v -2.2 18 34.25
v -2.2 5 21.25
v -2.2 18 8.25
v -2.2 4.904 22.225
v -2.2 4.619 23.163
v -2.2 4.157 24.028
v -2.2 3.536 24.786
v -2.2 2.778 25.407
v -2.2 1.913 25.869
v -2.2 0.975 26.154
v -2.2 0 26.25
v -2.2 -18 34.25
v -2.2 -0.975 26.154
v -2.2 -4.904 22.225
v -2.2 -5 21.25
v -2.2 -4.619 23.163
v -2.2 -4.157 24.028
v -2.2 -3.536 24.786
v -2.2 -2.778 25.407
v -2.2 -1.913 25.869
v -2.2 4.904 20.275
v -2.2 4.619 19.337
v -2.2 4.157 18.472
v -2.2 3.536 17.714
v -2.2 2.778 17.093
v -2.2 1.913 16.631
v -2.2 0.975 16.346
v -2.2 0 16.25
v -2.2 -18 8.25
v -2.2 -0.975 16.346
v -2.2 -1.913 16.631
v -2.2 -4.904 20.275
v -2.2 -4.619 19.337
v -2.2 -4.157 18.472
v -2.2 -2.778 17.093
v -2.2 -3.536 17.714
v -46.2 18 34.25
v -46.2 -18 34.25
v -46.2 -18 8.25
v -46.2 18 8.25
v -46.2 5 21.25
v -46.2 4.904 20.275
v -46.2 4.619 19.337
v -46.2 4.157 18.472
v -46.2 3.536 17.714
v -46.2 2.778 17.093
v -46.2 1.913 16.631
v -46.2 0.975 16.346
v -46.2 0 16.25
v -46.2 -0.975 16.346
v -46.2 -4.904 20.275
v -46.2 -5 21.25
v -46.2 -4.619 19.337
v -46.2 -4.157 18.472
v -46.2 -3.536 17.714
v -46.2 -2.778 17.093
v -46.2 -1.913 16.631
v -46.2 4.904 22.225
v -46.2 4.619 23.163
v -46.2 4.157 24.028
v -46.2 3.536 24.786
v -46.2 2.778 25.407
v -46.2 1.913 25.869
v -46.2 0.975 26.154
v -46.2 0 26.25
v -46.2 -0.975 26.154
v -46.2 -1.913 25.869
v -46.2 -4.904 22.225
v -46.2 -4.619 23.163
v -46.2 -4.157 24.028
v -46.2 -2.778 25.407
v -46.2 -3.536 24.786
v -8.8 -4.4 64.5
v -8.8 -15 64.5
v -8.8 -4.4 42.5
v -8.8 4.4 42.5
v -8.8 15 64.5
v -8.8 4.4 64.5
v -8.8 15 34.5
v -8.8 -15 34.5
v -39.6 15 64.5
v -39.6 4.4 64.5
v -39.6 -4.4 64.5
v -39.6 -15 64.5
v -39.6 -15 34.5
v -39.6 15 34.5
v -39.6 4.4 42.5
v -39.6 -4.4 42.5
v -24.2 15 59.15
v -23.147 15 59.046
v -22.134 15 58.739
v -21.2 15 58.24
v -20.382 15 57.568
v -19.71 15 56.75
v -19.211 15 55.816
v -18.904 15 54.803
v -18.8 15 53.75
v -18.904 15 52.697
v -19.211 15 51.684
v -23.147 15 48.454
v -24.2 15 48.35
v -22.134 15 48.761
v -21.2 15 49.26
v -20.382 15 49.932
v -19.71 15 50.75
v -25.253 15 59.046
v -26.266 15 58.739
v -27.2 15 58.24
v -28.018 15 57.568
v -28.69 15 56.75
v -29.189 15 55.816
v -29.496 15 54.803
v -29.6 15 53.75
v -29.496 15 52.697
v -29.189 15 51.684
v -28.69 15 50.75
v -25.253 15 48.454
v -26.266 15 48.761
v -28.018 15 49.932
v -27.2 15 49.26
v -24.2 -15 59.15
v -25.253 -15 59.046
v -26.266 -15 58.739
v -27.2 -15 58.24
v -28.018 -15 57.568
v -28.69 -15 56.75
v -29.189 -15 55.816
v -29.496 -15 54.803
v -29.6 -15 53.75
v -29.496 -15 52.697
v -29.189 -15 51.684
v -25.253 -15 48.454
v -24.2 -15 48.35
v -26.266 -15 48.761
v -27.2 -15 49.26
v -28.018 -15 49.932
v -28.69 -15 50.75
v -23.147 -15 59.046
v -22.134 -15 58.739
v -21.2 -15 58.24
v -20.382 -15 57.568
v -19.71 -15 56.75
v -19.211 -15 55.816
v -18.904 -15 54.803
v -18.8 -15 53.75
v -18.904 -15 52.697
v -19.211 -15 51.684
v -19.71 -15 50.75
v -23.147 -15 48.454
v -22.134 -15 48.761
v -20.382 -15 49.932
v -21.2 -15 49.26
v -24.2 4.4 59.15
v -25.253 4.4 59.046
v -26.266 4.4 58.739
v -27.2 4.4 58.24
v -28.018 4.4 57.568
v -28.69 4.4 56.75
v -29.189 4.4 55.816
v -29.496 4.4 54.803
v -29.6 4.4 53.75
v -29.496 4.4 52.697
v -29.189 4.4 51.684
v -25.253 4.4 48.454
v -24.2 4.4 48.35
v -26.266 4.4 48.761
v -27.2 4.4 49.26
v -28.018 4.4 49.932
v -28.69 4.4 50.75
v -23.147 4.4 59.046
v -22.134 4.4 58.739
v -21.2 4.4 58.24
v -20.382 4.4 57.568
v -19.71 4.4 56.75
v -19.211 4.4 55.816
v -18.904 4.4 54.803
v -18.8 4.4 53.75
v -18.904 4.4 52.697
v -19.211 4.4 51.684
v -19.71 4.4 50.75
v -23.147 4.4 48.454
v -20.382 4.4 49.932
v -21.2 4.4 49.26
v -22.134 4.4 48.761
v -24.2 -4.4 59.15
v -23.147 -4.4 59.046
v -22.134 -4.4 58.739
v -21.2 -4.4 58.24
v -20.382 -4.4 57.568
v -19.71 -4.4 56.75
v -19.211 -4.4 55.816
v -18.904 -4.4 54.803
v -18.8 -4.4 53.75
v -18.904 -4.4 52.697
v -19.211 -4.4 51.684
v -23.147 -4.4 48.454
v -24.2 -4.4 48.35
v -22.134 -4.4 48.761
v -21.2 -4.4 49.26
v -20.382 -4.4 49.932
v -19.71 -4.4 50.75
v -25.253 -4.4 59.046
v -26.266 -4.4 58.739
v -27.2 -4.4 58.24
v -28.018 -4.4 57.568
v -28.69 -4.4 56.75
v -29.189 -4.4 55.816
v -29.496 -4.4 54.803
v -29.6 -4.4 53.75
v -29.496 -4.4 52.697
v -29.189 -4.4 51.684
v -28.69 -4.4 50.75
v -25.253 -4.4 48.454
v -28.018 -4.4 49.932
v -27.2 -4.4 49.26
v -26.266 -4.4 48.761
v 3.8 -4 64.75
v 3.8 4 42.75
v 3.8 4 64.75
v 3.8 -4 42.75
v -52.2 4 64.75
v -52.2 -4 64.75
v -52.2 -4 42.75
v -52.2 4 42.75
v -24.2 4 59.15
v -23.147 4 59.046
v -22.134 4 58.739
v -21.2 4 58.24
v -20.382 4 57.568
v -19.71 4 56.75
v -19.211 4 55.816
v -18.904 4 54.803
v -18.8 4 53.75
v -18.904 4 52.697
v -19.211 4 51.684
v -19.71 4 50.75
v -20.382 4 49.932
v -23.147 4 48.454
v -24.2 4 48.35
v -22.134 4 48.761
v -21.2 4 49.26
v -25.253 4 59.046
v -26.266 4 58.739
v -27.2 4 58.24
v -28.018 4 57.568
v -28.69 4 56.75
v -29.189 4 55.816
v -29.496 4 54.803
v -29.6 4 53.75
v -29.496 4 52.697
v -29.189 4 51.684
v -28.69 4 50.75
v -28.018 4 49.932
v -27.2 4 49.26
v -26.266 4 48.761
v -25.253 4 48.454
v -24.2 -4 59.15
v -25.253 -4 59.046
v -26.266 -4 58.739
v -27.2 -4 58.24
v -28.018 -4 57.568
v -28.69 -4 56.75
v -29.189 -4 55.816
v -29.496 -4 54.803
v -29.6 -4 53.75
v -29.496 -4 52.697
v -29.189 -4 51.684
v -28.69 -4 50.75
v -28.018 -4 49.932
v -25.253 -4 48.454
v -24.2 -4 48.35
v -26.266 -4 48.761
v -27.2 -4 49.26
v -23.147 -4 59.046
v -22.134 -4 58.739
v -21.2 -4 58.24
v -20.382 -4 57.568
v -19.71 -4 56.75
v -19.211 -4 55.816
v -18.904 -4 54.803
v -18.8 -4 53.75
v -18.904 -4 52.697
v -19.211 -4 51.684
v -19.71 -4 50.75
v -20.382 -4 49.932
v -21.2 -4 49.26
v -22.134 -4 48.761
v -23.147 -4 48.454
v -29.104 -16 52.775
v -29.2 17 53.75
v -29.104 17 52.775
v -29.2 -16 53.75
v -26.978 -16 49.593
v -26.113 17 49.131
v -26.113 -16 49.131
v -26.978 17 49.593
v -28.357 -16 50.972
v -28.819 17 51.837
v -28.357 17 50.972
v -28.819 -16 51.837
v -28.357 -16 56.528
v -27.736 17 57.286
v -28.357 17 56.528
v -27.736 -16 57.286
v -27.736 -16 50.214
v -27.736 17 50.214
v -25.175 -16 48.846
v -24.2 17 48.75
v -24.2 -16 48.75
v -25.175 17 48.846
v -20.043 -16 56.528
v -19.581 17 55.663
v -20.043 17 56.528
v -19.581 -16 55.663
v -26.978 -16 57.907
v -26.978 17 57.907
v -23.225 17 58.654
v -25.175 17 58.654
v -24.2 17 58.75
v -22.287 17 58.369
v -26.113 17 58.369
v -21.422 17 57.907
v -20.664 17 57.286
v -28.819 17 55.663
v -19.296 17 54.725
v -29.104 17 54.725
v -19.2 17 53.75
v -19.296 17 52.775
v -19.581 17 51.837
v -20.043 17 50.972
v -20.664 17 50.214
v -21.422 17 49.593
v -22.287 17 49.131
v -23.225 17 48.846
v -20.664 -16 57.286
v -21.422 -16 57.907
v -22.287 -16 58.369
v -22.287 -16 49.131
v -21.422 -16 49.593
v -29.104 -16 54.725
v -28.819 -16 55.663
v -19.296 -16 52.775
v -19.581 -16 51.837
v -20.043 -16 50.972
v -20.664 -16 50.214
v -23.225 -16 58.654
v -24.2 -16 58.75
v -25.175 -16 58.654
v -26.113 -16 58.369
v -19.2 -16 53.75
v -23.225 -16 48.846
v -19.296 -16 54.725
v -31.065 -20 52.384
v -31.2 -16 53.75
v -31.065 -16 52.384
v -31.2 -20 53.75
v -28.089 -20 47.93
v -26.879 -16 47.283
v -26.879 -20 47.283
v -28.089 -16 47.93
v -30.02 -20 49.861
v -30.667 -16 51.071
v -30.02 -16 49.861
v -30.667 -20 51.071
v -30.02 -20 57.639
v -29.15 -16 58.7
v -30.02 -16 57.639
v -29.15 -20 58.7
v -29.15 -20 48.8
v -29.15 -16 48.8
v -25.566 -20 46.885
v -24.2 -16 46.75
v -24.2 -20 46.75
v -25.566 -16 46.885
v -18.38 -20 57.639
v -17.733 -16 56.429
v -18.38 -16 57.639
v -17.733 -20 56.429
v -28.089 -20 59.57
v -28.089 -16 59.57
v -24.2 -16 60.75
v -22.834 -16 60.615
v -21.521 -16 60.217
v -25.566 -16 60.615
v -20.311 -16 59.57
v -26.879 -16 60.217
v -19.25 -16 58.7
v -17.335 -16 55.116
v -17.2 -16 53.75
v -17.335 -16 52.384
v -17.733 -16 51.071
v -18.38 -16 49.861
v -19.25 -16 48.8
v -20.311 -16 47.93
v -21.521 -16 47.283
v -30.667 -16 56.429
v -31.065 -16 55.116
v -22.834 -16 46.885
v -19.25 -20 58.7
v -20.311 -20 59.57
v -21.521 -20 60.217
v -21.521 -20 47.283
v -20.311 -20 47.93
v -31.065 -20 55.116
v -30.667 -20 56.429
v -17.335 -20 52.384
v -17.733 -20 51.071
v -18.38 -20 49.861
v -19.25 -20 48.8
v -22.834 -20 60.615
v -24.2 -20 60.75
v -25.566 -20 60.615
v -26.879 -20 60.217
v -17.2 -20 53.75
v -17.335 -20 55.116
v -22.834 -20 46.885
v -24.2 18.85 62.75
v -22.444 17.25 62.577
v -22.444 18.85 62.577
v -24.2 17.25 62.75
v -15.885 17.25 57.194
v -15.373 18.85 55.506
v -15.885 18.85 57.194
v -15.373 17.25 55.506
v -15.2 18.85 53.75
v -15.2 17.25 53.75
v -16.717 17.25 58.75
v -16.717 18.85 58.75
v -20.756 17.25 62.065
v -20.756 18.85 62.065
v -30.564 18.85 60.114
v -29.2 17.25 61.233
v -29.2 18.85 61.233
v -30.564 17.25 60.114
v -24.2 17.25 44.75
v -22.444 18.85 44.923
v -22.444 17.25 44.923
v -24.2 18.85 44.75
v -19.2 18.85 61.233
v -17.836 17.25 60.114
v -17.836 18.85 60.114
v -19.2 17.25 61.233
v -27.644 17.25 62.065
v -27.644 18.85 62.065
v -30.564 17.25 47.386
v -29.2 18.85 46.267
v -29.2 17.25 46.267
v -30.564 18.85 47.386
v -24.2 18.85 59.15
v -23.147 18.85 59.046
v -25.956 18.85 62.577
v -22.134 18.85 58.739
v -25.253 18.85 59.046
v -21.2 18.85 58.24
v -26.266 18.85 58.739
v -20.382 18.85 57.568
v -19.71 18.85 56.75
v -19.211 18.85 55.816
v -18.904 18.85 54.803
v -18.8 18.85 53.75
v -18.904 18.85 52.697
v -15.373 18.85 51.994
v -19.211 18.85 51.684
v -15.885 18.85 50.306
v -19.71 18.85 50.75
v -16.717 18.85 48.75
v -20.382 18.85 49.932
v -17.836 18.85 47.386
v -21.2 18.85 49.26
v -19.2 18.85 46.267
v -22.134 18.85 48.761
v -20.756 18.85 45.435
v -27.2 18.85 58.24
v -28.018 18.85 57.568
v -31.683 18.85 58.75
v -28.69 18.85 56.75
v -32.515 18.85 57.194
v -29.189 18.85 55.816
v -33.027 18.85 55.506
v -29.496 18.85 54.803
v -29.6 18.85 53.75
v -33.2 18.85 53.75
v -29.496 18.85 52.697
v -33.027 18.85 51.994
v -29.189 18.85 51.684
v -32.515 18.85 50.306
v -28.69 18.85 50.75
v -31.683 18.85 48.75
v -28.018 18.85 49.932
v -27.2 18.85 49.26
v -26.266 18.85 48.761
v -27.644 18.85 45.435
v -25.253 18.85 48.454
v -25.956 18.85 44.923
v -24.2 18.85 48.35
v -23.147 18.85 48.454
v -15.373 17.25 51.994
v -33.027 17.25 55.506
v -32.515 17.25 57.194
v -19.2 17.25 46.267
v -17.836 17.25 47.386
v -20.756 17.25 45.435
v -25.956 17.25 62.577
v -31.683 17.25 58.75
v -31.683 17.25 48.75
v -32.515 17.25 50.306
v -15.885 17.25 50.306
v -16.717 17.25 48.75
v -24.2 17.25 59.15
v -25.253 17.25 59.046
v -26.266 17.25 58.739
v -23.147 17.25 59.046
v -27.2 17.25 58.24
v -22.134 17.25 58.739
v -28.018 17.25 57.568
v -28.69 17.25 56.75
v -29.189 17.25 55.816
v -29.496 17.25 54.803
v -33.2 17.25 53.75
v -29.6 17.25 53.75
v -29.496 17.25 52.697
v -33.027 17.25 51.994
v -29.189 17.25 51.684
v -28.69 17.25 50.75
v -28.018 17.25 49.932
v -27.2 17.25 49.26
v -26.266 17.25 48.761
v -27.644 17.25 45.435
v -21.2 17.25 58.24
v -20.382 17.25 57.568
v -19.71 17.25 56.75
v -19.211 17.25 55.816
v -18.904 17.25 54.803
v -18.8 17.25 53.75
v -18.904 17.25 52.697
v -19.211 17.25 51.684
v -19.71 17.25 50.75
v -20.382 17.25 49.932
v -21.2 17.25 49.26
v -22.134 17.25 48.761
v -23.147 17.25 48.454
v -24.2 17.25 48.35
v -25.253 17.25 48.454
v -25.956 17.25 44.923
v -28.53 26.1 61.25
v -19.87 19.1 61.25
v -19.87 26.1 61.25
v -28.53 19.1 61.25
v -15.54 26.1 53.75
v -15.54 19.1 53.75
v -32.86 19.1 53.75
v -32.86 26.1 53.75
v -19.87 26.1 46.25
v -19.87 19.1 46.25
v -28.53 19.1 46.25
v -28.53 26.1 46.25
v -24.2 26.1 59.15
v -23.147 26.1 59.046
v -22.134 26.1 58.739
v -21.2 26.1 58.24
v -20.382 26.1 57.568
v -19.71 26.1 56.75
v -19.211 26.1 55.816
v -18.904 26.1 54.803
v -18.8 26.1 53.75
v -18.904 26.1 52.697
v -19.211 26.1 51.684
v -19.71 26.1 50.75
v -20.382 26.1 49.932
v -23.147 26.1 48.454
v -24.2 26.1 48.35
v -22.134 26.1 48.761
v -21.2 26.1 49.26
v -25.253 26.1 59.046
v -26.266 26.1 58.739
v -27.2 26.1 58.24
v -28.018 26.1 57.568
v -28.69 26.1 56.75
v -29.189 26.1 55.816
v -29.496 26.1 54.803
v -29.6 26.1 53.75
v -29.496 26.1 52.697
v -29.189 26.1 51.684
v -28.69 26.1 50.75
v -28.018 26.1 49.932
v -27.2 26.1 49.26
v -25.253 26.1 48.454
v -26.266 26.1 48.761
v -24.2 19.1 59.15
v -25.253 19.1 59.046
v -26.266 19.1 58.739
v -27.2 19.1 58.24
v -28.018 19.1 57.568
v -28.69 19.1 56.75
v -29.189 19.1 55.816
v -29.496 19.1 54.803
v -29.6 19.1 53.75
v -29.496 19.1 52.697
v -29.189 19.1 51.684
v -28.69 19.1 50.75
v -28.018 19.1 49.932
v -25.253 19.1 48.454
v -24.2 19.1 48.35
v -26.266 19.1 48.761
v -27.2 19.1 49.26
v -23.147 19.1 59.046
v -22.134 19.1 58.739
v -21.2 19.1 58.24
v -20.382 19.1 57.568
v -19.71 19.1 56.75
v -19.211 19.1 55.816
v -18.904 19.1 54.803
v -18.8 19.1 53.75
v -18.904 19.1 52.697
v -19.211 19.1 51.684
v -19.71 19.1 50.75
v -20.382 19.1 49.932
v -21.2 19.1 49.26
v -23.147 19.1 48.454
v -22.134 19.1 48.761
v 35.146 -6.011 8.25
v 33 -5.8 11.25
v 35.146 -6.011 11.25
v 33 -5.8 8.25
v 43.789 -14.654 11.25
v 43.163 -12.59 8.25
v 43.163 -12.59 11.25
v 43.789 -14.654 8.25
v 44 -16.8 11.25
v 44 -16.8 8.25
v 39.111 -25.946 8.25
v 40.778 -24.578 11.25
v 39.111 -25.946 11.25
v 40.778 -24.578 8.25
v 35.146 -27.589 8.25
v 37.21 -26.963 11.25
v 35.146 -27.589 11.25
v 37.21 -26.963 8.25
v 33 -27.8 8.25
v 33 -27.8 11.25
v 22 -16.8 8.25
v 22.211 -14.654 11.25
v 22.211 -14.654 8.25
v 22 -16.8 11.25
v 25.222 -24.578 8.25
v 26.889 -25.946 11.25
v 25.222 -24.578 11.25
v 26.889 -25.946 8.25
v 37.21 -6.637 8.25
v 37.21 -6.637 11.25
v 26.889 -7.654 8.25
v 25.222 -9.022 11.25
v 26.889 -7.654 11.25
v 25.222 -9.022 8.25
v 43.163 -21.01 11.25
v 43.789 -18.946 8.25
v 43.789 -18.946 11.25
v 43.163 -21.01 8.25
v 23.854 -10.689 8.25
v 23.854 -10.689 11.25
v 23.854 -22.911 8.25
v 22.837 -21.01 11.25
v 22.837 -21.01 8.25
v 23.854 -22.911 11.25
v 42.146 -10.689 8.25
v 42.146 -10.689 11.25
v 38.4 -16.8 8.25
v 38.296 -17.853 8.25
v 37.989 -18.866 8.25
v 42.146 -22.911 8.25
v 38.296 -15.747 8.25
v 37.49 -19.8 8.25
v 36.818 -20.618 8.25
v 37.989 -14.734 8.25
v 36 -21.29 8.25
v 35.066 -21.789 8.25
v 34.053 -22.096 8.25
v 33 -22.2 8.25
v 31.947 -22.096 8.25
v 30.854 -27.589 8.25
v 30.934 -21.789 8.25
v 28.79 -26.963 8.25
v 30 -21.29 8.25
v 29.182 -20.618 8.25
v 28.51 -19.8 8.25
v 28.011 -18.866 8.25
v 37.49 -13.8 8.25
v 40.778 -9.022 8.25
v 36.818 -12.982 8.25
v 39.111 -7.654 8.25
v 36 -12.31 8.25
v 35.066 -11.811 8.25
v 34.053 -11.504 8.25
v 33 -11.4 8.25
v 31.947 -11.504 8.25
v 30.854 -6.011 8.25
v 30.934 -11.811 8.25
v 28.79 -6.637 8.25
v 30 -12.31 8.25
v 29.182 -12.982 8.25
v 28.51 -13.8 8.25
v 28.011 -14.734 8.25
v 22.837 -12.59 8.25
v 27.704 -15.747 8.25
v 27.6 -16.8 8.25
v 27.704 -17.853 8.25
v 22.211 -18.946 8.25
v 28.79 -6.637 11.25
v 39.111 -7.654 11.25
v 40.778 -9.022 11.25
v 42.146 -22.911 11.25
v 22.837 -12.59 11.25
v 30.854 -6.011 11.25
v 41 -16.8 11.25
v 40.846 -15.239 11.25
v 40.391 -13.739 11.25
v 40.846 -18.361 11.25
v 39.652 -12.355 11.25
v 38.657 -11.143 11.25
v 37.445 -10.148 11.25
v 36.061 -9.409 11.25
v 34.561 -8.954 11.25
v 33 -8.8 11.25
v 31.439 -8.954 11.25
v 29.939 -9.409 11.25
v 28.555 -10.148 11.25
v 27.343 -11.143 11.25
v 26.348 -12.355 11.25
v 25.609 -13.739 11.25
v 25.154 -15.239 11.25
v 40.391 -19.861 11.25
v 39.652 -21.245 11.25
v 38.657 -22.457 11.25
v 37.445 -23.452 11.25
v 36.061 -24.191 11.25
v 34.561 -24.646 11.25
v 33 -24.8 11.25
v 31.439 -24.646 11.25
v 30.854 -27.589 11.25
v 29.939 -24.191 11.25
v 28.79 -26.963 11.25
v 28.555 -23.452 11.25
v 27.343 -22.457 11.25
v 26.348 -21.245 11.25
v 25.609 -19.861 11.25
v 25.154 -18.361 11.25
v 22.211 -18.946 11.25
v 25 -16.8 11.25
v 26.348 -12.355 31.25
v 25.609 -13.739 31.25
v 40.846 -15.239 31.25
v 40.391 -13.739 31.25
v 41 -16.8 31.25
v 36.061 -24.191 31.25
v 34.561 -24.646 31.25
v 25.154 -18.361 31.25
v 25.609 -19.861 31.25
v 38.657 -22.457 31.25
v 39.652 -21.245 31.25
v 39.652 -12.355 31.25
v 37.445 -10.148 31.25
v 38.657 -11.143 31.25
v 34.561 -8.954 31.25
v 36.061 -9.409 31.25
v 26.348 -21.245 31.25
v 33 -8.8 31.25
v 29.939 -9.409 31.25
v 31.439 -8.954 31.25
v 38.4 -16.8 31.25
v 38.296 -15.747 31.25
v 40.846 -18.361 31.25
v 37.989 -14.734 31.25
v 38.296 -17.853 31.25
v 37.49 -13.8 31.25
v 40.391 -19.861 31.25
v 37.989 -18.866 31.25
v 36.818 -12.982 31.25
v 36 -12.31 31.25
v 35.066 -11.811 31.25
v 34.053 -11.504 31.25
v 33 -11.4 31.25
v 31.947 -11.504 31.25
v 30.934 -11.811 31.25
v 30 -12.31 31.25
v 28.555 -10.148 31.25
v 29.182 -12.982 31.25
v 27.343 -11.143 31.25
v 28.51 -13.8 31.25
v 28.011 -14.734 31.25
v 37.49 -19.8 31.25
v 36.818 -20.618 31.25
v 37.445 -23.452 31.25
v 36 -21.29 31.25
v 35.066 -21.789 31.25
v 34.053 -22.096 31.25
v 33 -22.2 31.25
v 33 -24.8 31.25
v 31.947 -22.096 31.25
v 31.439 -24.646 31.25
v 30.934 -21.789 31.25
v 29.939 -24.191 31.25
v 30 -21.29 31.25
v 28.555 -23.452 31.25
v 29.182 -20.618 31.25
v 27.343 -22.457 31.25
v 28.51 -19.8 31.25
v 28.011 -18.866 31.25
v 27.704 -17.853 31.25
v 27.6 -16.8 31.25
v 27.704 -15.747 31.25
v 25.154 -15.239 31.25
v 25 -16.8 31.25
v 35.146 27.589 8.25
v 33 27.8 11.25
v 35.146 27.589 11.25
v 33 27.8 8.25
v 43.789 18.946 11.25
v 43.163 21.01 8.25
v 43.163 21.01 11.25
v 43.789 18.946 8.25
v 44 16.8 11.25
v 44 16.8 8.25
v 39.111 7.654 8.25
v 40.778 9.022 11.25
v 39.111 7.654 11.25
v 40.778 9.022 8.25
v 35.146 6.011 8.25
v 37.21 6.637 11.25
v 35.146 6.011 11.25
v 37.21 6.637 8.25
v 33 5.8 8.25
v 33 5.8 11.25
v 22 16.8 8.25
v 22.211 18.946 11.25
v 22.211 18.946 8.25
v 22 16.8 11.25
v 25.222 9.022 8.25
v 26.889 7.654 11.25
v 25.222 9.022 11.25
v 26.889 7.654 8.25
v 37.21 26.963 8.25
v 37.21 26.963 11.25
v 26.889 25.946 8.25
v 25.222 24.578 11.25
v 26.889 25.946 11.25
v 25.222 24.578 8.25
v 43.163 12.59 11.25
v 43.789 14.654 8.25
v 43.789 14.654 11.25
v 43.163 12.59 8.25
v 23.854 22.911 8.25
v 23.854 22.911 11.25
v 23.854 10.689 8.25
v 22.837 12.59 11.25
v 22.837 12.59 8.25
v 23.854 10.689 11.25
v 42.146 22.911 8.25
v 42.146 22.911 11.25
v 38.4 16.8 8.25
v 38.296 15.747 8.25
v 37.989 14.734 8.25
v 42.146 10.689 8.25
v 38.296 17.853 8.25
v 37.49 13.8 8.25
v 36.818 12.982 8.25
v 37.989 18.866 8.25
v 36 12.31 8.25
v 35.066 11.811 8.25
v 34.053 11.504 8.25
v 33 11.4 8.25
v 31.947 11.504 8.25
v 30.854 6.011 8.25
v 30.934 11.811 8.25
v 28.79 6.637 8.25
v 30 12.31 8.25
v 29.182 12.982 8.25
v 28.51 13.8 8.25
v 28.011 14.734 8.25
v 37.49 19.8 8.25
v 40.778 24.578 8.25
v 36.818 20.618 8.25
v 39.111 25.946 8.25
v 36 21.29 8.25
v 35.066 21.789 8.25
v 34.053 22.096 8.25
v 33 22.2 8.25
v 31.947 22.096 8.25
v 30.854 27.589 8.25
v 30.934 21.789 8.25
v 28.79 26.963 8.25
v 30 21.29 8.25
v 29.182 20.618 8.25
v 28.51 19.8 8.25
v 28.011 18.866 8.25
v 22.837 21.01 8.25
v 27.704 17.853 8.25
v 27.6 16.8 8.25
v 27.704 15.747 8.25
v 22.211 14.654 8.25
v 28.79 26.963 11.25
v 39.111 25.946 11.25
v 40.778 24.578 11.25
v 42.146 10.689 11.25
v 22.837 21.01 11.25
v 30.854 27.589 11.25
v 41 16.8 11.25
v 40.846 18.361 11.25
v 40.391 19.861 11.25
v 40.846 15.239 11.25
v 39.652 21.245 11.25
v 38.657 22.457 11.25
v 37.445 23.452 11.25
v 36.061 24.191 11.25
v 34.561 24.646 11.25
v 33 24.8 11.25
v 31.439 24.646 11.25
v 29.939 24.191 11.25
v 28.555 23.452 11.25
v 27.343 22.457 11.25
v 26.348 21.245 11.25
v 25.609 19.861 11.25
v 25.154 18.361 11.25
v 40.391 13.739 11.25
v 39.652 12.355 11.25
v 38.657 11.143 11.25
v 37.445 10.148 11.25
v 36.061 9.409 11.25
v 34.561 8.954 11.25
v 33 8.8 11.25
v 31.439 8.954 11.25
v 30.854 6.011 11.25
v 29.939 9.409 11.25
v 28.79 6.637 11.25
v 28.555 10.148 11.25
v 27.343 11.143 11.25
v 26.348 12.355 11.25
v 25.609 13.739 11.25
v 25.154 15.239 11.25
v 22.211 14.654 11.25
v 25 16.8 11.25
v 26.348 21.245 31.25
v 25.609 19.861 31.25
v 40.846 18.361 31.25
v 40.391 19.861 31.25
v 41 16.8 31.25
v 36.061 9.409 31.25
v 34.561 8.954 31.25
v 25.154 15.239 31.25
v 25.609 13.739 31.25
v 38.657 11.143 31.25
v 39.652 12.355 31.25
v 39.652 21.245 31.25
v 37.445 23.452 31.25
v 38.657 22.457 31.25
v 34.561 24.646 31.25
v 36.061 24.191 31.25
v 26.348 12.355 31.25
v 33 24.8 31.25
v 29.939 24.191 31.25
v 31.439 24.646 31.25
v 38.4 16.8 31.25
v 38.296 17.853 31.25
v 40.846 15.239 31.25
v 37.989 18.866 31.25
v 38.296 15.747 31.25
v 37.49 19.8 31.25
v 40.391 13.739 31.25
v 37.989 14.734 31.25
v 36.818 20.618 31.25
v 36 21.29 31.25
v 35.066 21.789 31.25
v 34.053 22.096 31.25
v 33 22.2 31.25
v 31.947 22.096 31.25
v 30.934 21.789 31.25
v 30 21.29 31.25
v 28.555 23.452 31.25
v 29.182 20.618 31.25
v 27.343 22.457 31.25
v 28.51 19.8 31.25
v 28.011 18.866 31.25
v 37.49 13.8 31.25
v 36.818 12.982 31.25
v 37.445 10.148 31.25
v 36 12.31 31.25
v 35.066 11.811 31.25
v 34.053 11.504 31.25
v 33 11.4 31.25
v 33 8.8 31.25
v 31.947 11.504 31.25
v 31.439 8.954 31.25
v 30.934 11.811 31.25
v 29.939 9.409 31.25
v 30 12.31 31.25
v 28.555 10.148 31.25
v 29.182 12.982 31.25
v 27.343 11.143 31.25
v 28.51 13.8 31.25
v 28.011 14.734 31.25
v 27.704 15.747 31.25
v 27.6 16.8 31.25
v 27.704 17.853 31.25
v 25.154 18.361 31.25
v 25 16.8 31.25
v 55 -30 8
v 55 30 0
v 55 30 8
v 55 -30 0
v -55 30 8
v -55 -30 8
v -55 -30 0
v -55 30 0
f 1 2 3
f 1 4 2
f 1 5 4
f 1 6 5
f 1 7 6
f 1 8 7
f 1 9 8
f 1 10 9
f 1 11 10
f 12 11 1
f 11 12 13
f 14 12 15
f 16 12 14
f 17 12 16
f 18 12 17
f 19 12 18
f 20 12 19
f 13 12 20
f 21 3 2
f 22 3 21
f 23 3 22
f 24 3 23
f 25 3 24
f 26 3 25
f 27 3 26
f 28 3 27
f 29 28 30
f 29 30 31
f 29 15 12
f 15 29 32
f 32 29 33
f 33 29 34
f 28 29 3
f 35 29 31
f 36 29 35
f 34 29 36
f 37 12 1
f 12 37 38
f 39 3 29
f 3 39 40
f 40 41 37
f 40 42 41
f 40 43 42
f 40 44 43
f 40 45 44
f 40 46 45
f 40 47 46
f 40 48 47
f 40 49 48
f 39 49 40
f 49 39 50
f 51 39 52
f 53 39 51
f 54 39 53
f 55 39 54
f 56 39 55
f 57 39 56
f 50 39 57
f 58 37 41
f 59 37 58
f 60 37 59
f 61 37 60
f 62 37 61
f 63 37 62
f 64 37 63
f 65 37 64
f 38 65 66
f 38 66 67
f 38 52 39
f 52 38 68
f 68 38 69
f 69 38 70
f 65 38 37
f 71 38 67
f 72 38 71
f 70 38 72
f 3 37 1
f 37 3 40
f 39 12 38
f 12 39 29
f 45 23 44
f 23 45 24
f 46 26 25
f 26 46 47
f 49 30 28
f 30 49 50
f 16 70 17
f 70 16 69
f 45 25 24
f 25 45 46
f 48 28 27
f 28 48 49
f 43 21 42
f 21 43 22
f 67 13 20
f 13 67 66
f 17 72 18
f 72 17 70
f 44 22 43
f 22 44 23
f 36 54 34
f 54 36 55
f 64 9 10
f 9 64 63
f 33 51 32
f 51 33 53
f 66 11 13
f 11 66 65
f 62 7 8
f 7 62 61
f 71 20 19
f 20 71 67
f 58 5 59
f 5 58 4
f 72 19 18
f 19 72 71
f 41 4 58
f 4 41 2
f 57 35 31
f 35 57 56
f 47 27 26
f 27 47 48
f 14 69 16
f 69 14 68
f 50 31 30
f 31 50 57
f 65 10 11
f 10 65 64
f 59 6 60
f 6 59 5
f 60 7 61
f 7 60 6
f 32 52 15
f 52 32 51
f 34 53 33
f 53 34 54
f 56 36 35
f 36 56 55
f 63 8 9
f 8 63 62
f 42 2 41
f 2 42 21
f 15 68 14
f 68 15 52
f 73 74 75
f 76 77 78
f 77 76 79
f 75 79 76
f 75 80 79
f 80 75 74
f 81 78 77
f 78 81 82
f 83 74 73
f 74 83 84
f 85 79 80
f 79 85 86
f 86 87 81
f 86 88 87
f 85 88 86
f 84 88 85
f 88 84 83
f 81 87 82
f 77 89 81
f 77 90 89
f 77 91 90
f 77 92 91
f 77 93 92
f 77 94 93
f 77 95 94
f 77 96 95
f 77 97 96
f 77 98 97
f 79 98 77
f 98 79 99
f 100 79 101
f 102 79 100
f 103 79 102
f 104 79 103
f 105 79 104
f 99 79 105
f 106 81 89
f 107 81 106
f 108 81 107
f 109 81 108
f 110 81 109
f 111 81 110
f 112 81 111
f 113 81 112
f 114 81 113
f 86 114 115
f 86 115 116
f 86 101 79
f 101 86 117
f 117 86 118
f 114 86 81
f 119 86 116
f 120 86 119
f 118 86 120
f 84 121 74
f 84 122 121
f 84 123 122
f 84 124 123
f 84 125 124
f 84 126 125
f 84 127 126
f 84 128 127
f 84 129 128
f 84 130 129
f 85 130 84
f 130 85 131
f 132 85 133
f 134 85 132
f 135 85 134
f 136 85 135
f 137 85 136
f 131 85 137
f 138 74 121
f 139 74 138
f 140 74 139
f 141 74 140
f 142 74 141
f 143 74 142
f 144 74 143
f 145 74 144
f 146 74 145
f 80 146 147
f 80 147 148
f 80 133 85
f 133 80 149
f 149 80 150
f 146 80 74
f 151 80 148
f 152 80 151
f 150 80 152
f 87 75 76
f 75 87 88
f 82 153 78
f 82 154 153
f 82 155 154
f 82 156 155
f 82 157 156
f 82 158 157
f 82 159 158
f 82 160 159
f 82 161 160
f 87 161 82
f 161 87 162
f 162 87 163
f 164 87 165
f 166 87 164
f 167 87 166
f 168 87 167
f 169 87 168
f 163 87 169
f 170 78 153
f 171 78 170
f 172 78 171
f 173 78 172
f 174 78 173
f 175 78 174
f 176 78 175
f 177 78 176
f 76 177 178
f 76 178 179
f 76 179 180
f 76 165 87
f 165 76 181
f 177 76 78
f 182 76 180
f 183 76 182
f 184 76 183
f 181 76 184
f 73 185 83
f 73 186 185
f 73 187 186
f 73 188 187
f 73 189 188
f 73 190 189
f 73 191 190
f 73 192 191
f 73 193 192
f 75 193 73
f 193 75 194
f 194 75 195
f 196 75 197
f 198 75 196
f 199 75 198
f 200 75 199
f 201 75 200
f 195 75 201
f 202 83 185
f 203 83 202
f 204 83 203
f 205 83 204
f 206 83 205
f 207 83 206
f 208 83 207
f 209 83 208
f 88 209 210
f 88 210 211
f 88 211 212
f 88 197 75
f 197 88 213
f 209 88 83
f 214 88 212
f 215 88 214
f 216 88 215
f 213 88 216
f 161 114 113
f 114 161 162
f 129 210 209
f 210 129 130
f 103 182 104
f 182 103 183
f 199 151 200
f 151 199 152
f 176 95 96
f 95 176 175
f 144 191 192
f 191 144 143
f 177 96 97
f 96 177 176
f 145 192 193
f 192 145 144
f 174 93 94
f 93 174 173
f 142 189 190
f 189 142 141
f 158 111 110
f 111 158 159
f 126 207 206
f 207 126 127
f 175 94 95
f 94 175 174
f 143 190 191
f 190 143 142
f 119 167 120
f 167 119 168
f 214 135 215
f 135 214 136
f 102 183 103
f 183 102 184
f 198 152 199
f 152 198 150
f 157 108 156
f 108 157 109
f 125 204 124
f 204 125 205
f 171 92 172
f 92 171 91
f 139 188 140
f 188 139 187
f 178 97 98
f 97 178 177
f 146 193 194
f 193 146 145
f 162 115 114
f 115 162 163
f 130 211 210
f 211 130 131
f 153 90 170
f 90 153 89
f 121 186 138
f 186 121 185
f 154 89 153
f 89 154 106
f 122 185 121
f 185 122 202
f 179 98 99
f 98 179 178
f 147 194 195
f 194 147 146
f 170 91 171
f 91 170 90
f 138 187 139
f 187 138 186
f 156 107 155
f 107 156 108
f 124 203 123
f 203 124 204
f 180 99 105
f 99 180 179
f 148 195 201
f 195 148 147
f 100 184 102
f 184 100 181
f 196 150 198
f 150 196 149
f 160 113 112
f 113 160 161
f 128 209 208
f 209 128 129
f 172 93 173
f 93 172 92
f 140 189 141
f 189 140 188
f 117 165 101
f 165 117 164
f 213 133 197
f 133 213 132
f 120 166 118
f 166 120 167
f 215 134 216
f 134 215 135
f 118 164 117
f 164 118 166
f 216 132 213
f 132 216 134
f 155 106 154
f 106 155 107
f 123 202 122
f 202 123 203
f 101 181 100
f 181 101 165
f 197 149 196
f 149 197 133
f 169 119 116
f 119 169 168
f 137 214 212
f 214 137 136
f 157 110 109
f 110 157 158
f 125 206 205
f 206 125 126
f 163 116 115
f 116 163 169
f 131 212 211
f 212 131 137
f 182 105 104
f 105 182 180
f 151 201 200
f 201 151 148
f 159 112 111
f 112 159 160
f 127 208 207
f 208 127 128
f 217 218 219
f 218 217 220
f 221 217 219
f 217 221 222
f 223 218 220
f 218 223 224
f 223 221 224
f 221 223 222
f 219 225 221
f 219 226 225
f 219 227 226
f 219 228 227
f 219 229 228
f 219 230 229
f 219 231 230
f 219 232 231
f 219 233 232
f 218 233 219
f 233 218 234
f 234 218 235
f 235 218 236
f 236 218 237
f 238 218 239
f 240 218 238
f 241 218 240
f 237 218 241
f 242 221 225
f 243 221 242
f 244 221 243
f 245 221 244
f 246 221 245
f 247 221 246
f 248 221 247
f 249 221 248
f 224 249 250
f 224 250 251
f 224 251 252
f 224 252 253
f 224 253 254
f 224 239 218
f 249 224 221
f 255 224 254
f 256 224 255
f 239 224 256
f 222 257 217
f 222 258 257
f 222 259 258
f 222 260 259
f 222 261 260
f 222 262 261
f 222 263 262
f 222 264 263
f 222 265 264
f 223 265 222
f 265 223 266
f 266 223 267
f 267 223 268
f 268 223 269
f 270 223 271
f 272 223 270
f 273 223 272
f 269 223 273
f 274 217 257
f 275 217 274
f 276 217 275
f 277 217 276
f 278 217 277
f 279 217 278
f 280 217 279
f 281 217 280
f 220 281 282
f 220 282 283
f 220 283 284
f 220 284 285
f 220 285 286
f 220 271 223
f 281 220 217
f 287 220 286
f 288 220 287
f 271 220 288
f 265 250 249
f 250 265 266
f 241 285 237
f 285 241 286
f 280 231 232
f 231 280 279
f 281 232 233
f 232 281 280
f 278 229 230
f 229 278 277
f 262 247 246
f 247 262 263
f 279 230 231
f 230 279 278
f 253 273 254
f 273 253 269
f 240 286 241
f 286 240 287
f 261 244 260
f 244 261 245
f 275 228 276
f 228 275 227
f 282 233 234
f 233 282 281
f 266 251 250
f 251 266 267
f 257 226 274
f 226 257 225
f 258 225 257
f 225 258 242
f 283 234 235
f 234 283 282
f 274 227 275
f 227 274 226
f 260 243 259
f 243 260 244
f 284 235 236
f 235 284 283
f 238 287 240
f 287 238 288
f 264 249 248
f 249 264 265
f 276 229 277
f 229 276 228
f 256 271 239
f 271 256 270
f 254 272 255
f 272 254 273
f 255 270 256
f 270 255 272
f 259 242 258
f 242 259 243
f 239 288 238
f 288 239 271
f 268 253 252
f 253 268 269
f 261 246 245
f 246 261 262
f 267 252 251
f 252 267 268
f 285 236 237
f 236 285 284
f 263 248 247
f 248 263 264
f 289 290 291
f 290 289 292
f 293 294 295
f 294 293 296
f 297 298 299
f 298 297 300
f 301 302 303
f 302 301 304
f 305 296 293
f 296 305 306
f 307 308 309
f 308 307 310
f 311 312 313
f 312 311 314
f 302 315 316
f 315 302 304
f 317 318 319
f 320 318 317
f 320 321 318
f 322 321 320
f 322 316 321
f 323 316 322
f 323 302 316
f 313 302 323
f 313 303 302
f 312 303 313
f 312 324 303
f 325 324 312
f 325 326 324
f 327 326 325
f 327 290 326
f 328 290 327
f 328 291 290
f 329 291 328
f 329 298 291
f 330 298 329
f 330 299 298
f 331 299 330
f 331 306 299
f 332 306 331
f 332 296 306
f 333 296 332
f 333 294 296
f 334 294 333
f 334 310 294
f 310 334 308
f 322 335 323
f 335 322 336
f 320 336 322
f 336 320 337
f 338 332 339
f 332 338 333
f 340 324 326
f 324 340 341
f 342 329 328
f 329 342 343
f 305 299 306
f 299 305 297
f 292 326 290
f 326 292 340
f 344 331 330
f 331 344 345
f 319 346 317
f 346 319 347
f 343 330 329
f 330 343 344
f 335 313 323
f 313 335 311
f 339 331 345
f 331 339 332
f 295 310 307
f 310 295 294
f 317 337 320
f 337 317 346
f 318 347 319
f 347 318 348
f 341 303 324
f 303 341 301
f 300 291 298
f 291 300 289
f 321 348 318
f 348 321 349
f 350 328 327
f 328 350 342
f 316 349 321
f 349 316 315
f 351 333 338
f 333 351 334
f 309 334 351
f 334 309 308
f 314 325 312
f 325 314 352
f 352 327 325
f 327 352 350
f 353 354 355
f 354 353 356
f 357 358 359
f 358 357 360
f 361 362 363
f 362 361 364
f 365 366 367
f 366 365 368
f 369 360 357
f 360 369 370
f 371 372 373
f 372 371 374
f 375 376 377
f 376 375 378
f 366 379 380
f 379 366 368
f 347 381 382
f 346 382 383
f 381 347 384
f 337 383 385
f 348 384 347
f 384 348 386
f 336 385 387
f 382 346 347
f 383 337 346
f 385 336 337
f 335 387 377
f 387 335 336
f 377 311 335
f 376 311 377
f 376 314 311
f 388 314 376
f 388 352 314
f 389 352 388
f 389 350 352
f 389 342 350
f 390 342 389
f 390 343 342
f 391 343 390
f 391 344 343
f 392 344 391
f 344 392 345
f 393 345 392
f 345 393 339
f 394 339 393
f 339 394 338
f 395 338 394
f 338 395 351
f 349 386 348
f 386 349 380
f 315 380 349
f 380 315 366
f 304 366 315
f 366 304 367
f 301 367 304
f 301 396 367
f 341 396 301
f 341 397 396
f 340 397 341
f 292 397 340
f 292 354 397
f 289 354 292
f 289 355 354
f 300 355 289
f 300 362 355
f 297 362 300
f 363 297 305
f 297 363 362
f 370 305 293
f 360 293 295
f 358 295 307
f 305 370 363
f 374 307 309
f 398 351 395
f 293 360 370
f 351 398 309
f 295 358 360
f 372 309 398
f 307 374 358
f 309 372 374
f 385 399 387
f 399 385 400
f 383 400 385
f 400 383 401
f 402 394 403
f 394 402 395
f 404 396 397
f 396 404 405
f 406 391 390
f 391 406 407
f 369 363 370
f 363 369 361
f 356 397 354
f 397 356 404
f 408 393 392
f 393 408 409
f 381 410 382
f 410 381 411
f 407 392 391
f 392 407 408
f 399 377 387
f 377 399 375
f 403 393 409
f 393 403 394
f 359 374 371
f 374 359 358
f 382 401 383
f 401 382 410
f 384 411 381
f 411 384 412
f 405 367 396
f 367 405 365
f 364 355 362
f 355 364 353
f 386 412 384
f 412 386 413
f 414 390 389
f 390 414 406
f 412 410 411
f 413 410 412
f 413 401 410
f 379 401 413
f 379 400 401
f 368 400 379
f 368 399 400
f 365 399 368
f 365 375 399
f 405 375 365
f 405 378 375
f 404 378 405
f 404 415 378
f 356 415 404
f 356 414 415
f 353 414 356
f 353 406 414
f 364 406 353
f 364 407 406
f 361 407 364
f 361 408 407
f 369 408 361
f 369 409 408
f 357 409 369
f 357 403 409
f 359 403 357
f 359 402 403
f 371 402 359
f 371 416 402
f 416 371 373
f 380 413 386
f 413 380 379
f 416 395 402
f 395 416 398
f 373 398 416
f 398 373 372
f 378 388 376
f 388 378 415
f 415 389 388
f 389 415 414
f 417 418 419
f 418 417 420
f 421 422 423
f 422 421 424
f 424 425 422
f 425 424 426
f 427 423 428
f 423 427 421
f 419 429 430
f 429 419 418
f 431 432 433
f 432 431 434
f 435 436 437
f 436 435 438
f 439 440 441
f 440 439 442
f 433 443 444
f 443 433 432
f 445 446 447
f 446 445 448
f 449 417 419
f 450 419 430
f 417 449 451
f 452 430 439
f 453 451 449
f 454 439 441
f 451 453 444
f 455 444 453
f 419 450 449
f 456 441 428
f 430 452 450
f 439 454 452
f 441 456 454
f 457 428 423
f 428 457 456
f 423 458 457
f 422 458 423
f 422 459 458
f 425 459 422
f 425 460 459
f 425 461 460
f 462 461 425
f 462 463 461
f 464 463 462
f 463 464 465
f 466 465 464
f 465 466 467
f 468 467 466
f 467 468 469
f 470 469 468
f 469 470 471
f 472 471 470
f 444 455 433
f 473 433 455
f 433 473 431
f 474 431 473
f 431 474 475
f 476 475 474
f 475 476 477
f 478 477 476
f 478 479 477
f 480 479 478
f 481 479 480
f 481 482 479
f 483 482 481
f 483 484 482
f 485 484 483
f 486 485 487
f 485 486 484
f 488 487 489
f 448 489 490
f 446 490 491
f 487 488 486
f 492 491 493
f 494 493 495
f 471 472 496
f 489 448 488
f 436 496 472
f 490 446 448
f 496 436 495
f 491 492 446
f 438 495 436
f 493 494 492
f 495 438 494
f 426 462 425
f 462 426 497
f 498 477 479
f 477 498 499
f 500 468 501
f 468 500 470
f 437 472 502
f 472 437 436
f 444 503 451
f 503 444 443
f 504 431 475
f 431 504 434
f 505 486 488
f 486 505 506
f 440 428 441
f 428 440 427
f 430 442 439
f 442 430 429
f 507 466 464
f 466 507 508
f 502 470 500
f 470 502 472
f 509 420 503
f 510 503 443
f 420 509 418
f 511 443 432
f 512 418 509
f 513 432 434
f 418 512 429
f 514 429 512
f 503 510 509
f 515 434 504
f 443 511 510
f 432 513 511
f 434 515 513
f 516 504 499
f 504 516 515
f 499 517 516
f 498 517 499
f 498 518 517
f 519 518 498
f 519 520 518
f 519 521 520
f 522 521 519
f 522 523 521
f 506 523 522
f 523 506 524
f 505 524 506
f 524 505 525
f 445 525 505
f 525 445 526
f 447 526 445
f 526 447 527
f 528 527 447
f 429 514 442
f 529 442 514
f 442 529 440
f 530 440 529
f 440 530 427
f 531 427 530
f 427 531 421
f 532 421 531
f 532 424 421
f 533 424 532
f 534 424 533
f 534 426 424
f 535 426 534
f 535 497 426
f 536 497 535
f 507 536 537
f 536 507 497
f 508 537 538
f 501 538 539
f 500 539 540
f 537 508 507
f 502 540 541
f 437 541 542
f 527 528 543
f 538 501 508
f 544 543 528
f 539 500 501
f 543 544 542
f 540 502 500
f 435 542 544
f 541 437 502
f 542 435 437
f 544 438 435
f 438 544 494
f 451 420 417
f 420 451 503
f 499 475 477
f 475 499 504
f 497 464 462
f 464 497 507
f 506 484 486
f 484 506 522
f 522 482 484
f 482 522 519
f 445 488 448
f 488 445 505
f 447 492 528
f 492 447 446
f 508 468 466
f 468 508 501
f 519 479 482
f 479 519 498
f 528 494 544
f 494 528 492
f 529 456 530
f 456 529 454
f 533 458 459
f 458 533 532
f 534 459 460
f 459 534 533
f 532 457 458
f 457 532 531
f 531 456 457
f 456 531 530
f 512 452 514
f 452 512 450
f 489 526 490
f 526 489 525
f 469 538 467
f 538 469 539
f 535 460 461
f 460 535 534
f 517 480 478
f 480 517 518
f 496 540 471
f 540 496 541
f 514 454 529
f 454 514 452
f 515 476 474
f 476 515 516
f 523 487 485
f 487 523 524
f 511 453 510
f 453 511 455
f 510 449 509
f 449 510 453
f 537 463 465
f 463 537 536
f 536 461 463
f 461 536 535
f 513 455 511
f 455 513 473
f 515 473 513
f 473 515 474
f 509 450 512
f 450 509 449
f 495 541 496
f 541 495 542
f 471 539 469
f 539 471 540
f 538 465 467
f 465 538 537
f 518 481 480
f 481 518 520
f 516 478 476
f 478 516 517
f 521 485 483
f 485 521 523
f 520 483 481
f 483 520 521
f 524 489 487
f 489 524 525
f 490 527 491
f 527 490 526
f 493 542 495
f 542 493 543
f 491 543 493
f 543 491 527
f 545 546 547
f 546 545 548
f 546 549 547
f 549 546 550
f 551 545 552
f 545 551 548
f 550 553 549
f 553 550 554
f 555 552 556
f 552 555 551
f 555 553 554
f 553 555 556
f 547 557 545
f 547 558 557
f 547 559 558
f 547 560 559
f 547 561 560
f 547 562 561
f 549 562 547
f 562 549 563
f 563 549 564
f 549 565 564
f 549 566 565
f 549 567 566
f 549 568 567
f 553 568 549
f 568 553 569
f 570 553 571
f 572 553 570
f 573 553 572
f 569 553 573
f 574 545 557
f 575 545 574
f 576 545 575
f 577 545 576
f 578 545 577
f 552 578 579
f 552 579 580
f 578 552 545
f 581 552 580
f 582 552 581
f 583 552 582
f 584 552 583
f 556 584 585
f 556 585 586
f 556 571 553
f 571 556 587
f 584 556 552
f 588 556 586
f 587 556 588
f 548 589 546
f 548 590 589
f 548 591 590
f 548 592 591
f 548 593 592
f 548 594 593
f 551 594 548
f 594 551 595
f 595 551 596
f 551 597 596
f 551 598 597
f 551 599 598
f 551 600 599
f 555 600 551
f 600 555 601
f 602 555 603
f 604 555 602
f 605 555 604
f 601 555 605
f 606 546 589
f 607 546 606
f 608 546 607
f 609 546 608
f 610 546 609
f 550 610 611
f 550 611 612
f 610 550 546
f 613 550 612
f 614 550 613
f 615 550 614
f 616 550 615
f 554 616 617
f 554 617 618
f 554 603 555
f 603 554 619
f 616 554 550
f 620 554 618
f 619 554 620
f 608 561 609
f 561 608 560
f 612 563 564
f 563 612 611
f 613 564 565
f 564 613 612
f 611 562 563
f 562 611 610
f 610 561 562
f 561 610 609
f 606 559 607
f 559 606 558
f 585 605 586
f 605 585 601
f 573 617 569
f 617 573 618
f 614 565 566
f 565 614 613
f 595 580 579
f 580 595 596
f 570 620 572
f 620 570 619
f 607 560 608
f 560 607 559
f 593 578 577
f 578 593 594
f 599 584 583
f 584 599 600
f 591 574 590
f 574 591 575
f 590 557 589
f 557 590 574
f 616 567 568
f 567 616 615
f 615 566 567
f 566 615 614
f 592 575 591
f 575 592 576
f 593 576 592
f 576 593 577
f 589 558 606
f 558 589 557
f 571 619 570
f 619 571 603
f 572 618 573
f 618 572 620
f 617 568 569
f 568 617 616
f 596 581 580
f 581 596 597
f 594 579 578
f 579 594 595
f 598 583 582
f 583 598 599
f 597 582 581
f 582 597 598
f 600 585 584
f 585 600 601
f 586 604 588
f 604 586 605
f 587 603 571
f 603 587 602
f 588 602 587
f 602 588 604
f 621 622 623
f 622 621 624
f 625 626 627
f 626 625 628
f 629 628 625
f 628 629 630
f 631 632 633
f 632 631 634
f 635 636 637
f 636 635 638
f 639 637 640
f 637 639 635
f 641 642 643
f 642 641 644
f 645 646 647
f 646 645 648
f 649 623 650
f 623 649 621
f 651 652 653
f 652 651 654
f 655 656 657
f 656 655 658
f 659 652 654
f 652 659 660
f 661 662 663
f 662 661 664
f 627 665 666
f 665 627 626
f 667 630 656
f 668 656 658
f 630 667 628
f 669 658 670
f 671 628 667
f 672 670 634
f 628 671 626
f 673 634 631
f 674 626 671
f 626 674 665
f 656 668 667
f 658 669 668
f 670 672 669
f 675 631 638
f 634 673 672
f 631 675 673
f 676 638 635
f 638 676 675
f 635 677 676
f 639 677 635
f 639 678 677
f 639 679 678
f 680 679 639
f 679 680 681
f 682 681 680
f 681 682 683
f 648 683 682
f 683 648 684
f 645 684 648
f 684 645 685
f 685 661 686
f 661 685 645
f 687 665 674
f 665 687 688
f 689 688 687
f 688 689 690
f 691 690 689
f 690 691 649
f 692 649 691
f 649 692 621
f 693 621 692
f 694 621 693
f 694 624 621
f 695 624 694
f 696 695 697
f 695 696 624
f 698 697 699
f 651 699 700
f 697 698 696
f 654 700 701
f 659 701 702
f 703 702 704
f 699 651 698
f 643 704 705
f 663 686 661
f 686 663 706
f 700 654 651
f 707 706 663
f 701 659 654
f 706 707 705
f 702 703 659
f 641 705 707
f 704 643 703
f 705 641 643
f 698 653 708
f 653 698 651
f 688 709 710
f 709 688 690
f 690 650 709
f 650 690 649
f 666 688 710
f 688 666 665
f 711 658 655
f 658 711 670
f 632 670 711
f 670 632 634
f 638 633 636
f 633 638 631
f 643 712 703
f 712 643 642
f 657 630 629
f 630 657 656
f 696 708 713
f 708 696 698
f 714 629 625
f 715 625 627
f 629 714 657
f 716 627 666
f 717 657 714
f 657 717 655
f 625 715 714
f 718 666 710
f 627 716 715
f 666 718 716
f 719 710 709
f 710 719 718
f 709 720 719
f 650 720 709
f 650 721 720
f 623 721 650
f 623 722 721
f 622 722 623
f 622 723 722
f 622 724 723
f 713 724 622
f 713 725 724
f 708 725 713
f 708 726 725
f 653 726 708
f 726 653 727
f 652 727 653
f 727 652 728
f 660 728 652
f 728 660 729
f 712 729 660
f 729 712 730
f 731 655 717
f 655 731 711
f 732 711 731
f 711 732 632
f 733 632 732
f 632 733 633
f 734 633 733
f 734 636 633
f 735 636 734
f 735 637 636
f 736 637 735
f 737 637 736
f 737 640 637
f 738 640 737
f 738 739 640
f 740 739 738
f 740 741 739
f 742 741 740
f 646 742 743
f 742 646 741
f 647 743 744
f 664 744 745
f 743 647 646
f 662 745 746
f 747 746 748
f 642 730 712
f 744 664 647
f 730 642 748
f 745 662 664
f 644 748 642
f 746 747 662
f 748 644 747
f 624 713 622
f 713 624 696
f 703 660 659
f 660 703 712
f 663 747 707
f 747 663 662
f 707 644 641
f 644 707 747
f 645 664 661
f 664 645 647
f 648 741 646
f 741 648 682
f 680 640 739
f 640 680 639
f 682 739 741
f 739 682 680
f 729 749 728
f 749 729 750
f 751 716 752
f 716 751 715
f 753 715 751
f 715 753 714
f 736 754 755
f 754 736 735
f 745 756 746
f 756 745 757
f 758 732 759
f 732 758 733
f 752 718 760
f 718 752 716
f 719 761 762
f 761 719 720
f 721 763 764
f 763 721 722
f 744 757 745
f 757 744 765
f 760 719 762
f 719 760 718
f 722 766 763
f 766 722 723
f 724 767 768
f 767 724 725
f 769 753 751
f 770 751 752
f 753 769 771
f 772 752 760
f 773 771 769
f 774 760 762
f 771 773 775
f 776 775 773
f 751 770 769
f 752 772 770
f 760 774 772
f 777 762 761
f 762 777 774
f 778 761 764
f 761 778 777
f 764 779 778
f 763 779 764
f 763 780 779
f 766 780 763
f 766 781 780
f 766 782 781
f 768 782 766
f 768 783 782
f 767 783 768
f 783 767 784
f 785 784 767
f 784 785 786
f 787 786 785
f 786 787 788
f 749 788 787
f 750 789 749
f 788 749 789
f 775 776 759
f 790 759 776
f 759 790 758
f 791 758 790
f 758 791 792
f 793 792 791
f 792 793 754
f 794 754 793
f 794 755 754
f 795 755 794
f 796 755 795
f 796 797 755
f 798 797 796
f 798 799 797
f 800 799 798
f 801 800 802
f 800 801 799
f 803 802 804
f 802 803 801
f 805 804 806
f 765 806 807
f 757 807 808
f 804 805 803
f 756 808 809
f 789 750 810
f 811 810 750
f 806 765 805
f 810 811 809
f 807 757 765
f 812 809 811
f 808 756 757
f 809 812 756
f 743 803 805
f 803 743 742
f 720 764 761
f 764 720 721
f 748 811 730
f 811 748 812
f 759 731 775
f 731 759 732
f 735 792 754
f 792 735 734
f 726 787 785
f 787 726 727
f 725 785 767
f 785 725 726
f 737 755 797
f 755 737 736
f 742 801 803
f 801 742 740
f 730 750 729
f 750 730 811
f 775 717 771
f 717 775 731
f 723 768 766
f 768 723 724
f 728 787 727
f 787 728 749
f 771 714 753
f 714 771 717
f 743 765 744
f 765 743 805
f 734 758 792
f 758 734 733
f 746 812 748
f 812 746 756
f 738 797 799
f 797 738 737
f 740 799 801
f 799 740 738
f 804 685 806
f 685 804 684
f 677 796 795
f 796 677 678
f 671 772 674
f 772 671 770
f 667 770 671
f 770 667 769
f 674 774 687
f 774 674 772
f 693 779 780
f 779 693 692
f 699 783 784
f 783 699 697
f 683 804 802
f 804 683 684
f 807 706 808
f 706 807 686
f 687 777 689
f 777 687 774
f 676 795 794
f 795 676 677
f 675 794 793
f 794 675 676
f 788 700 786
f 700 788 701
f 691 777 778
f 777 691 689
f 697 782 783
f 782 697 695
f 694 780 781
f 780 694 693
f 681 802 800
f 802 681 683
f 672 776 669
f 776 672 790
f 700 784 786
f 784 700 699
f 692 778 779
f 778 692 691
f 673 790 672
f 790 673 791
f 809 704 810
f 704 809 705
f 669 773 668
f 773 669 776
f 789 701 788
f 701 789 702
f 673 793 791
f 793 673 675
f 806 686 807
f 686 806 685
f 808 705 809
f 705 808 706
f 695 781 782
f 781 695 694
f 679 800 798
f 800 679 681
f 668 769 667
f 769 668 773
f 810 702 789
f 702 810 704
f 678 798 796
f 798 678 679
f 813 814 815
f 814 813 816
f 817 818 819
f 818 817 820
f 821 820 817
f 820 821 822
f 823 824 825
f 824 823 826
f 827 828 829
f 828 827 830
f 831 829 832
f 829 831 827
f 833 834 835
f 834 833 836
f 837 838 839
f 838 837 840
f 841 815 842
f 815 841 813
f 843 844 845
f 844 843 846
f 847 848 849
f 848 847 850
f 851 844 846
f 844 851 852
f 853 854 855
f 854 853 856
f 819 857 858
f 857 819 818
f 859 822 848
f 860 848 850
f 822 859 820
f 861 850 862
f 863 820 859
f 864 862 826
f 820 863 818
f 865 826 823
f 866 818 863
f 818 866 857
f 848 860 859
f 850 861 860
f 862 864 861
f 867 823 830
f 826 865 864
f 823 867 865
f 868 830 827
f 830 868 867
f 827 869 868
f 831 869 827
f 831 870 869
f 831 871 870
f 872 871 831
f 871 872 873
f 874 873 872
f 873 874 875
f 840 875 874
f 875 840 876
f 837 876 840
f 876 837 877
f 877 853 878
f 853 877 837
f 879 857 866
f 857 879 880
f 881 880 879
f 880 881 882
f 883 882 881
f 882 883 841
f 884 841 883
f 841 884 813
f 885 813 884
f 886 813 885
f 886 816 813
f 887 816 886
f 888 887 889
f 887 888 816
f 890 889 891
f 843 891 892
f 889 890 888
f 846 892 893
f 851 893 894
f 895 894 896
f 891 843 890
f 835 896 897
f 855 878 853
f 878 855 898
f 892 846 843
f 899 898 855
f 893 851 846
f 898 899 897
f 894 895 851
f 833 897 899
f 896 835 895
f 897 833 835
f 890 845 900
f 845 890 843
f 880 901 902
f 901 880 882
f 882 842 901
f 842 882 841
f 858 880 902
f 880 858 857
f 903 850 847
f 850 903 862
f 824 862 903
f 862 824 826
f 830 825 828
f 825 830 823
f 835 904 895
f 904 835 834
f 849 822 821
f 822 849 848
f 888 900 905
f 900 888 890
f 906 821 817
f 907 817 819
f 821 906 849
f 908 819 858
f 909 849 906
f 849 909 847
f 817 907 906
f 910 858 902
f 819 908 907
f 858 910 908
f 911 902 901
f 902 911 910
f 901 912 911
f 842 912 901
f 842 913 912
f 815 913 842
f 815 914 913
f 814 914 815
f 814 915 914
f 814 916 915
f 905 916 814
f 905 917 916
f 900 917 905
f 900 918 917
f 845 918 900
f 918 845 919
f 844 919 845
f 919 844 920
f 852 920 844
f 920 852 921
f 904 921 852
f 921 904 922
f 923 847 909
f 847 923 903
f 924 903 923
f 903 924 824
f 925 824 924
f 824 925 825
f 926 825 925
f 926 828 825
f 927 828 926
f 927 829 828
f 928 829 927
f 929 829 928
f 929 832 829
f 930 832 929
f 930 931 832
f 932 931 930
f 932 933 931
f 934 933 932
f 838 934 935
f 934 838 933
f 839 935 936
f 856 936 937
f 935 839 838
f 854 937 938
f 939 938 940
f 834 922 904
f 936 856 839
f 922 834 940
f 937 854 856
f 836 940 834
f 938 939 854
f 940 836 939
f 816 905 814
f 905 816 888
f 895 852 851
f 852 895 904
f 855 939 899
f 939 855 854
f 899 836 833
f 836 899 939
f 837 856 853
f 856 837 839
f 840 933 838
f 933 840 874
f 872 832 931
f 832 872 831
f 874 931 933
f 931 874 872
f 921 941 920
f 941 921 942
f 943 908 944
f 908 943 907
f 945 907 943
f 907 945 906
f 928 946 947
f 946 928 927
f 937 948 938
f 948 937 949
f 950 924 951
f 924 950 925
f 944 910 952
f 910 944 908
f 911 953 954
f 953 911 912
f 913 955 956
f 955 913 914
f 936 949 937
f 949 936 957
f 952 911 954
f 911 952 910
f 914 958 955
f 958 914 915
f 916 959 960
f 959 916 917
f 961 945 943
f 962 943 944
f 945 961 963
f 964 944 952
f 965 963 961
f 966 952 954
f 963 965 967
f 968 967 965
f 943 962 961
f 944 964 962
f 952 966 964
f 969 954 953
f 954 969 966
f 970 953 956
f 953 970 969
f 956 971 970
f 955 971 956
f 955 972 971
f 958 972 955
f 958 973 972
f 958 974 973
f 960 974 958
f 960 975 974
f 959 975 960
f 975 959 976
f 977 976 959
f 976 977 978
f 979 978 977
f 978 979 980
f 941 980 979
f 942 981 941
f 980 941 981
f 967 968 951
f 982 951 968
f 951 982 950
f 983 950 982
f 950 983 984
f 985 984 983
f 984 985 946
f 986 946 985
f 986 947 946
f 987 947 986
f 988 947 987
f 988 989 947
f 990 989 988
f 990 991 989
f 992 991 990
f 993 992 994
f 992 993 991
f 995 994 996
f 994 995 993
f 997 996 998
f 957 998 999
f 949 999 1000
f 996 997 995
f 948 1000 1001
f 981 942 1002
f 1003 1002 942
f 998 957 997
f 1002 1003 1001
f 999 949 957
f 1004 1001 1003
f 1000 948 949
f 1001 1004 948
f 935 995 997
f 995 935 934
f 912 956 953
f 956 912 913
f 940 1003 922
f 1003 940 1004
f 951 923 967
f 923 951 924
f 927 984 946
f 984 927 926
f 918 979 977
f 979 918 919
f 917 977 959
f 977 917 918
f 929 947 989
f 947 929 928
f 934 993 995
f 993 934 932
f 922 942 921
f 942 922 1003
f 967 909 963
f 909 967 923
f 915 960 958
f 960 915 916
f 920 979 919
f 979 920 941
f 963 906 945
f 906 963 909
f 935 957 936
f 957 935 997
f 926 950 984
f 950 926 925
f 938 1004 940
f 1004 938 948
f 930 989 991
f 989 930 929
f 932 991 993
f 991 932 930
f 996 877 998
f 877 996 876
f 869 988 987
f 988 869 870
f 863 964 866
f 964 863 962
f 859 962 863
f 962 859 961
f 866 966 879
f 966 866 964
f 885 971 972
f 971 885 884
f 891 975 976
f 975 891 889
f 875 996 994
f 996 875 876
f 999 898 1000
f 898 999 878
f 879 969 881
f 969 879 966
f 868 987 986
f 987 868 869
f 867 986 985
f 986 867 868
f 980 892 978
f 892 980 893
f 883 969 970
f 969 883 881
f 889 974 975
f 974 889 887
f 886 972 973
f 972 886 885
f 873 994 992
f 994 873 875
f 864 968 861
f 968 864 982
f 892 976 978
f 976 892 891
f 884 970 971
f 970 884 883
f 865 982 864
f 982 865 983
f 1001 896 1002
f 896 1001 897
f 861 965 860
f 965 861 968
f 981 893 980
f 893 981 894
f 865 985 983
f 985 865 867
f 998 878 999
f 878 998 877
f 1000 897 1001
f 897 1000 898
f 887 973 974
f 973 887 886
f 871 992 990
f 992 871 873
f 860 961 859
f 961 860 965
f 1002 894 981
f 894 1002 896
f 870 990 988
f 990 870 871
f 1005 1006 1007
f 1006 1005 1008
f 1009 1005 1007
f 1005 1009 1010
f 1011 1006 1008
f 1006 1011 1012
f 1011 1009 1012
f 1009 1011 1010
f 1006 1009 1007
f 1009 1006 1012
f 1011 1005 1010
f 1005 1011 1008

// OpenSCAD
$fn = 32;

// ------------------------------------------------------------------------
// Indexing jig: plate 110 x 60 mm, pin d10
// Every part is its own module, assembly() places every instance.
// ------------------------------------------------------------------------

// --- part 1 ---
module jig_plate() {
  difference() {
    translate([-55, -30, 0]) cube([110, 60, 8]);
  }
}

// --- part 2 ---
module locator_block() {
  difference() {
    translate([-22, -18, 0]) cube([44, 36, 26]);
    translate([0, 0, 13]) rotate([0, 90, 0]) cylinder(h = 46, d = 10, center = true);
  }
}

// --- part 3 ---
module index_fork() {
  difference() {
    translate([-15.4, -15, 0]) cube([30.8, 30, 30]);
    translate([-16.4, -4.4, 8]) cube([32.8, 8.8, 23]);
    translate([0, 0, 19.25]) rotate([90, 0, 0]) cylinder(h = 32, d = 10.8, center = true);
  }
}

// --- part 4 ---
module index_arm() {
  difference() {
    translate([-28, -4, 0]) cube([56, 8, 22]);
    translate([0, 0, 11]) rotate([90, 0, 0]) cylinder(h = 10, d = 10.8, center = true);
  }
}

// --- part 5 ---
module index_pin() {
  rotate([0, 90, 0]) cylinder(h = 34, d = 10, center = true);
  translate([-20, 0, 0]) rotate([0, 90, 0]) cylinder(h = 4, d = 14);
}

// --- part 6 ---
module pin_washer() {
  difference() {
      translate([0, 0, 0]) cylinder(h = 1.6, d = 18);
      translate([0, 0, -1]) cylinder(h = 3.6, d = 10.8);
    }
}

// --- part 7 ---
module lock_nut() {
  difference() {
    linear_extrude(height = 7) polygon(points = [[8.66, 0], [4.33, 7.5], [-4.33, 7.5], [-8.66, 0], [-4.33, -7.5], [4.33, -7.5]]);
    translate([0, 0, -1]) cylinder(h = 9, d = 10.8);
  }
}

// --- part 8 ---
module guide_bush_a() {
  difference() {
    union() {
      cylinder(h = 3, d = 22);
      translate([0, 0, 3]) cylinder(h = 20, d = 16);
    }
    translate([0, 0, -1]) cylinder(h = 25, d = 10.8);
  }
}

// --- part 9 ---
module guide_bush_b() {
  difference() {
    union() {
      cylinder(h = 3, d = 22);
      translate([0, 0, 3]) cylinder(h = 20, d = 16);
    }
    translate([0, 0, -1]) cylinder(h = 25, d = 10.8);
  }
}

// --- assembly ---
module assembly() {
  color([0.80, 0.24, 0.20]) translate([0, 0, 0]) rotate([0, 0, 0]) jig_plate();
  color([0.20, 0.45, 0.75]) translate([-24.2, 0, 8.25]) rotate([0, 0, 0]) locator_block();
  color([0.25, 0.62, 0.32]) translate([-24.2, 0, 34.5]) rotate([0, 0, 0]) index_fork();
  color([0.92, 0.70, 0.18]) translate([-24.2, 0, 42.75]) rotate([0, 0, 0]) index_arm();
  color([0.58, 0.35, 0.70]) translate([-24.2, 0, 53.75]) rotate([0, 0, 90]) index_pin();
  color([0.16, 0.66, 0.66]) translate([-24.2, 18.85, 53.75]) rotate([90, 0, 0]) pin_washer();
  color([0.85, 0.48, 0.18]) translate([-24.2, 26.1, 53.75]) rotate([90, 0, 0]) lock_nut();
  color([0.55, 0.60, 0.65]) translate([33, -16.8, 8.25]) rotate([0, 0, 0]) guide_bush_a();
  color([0.75, 0.30, 0.55]) translate([33, 16.8, 8.25]) rotate([0, 0, 0]) guide_bush_b();
}

assembly();
